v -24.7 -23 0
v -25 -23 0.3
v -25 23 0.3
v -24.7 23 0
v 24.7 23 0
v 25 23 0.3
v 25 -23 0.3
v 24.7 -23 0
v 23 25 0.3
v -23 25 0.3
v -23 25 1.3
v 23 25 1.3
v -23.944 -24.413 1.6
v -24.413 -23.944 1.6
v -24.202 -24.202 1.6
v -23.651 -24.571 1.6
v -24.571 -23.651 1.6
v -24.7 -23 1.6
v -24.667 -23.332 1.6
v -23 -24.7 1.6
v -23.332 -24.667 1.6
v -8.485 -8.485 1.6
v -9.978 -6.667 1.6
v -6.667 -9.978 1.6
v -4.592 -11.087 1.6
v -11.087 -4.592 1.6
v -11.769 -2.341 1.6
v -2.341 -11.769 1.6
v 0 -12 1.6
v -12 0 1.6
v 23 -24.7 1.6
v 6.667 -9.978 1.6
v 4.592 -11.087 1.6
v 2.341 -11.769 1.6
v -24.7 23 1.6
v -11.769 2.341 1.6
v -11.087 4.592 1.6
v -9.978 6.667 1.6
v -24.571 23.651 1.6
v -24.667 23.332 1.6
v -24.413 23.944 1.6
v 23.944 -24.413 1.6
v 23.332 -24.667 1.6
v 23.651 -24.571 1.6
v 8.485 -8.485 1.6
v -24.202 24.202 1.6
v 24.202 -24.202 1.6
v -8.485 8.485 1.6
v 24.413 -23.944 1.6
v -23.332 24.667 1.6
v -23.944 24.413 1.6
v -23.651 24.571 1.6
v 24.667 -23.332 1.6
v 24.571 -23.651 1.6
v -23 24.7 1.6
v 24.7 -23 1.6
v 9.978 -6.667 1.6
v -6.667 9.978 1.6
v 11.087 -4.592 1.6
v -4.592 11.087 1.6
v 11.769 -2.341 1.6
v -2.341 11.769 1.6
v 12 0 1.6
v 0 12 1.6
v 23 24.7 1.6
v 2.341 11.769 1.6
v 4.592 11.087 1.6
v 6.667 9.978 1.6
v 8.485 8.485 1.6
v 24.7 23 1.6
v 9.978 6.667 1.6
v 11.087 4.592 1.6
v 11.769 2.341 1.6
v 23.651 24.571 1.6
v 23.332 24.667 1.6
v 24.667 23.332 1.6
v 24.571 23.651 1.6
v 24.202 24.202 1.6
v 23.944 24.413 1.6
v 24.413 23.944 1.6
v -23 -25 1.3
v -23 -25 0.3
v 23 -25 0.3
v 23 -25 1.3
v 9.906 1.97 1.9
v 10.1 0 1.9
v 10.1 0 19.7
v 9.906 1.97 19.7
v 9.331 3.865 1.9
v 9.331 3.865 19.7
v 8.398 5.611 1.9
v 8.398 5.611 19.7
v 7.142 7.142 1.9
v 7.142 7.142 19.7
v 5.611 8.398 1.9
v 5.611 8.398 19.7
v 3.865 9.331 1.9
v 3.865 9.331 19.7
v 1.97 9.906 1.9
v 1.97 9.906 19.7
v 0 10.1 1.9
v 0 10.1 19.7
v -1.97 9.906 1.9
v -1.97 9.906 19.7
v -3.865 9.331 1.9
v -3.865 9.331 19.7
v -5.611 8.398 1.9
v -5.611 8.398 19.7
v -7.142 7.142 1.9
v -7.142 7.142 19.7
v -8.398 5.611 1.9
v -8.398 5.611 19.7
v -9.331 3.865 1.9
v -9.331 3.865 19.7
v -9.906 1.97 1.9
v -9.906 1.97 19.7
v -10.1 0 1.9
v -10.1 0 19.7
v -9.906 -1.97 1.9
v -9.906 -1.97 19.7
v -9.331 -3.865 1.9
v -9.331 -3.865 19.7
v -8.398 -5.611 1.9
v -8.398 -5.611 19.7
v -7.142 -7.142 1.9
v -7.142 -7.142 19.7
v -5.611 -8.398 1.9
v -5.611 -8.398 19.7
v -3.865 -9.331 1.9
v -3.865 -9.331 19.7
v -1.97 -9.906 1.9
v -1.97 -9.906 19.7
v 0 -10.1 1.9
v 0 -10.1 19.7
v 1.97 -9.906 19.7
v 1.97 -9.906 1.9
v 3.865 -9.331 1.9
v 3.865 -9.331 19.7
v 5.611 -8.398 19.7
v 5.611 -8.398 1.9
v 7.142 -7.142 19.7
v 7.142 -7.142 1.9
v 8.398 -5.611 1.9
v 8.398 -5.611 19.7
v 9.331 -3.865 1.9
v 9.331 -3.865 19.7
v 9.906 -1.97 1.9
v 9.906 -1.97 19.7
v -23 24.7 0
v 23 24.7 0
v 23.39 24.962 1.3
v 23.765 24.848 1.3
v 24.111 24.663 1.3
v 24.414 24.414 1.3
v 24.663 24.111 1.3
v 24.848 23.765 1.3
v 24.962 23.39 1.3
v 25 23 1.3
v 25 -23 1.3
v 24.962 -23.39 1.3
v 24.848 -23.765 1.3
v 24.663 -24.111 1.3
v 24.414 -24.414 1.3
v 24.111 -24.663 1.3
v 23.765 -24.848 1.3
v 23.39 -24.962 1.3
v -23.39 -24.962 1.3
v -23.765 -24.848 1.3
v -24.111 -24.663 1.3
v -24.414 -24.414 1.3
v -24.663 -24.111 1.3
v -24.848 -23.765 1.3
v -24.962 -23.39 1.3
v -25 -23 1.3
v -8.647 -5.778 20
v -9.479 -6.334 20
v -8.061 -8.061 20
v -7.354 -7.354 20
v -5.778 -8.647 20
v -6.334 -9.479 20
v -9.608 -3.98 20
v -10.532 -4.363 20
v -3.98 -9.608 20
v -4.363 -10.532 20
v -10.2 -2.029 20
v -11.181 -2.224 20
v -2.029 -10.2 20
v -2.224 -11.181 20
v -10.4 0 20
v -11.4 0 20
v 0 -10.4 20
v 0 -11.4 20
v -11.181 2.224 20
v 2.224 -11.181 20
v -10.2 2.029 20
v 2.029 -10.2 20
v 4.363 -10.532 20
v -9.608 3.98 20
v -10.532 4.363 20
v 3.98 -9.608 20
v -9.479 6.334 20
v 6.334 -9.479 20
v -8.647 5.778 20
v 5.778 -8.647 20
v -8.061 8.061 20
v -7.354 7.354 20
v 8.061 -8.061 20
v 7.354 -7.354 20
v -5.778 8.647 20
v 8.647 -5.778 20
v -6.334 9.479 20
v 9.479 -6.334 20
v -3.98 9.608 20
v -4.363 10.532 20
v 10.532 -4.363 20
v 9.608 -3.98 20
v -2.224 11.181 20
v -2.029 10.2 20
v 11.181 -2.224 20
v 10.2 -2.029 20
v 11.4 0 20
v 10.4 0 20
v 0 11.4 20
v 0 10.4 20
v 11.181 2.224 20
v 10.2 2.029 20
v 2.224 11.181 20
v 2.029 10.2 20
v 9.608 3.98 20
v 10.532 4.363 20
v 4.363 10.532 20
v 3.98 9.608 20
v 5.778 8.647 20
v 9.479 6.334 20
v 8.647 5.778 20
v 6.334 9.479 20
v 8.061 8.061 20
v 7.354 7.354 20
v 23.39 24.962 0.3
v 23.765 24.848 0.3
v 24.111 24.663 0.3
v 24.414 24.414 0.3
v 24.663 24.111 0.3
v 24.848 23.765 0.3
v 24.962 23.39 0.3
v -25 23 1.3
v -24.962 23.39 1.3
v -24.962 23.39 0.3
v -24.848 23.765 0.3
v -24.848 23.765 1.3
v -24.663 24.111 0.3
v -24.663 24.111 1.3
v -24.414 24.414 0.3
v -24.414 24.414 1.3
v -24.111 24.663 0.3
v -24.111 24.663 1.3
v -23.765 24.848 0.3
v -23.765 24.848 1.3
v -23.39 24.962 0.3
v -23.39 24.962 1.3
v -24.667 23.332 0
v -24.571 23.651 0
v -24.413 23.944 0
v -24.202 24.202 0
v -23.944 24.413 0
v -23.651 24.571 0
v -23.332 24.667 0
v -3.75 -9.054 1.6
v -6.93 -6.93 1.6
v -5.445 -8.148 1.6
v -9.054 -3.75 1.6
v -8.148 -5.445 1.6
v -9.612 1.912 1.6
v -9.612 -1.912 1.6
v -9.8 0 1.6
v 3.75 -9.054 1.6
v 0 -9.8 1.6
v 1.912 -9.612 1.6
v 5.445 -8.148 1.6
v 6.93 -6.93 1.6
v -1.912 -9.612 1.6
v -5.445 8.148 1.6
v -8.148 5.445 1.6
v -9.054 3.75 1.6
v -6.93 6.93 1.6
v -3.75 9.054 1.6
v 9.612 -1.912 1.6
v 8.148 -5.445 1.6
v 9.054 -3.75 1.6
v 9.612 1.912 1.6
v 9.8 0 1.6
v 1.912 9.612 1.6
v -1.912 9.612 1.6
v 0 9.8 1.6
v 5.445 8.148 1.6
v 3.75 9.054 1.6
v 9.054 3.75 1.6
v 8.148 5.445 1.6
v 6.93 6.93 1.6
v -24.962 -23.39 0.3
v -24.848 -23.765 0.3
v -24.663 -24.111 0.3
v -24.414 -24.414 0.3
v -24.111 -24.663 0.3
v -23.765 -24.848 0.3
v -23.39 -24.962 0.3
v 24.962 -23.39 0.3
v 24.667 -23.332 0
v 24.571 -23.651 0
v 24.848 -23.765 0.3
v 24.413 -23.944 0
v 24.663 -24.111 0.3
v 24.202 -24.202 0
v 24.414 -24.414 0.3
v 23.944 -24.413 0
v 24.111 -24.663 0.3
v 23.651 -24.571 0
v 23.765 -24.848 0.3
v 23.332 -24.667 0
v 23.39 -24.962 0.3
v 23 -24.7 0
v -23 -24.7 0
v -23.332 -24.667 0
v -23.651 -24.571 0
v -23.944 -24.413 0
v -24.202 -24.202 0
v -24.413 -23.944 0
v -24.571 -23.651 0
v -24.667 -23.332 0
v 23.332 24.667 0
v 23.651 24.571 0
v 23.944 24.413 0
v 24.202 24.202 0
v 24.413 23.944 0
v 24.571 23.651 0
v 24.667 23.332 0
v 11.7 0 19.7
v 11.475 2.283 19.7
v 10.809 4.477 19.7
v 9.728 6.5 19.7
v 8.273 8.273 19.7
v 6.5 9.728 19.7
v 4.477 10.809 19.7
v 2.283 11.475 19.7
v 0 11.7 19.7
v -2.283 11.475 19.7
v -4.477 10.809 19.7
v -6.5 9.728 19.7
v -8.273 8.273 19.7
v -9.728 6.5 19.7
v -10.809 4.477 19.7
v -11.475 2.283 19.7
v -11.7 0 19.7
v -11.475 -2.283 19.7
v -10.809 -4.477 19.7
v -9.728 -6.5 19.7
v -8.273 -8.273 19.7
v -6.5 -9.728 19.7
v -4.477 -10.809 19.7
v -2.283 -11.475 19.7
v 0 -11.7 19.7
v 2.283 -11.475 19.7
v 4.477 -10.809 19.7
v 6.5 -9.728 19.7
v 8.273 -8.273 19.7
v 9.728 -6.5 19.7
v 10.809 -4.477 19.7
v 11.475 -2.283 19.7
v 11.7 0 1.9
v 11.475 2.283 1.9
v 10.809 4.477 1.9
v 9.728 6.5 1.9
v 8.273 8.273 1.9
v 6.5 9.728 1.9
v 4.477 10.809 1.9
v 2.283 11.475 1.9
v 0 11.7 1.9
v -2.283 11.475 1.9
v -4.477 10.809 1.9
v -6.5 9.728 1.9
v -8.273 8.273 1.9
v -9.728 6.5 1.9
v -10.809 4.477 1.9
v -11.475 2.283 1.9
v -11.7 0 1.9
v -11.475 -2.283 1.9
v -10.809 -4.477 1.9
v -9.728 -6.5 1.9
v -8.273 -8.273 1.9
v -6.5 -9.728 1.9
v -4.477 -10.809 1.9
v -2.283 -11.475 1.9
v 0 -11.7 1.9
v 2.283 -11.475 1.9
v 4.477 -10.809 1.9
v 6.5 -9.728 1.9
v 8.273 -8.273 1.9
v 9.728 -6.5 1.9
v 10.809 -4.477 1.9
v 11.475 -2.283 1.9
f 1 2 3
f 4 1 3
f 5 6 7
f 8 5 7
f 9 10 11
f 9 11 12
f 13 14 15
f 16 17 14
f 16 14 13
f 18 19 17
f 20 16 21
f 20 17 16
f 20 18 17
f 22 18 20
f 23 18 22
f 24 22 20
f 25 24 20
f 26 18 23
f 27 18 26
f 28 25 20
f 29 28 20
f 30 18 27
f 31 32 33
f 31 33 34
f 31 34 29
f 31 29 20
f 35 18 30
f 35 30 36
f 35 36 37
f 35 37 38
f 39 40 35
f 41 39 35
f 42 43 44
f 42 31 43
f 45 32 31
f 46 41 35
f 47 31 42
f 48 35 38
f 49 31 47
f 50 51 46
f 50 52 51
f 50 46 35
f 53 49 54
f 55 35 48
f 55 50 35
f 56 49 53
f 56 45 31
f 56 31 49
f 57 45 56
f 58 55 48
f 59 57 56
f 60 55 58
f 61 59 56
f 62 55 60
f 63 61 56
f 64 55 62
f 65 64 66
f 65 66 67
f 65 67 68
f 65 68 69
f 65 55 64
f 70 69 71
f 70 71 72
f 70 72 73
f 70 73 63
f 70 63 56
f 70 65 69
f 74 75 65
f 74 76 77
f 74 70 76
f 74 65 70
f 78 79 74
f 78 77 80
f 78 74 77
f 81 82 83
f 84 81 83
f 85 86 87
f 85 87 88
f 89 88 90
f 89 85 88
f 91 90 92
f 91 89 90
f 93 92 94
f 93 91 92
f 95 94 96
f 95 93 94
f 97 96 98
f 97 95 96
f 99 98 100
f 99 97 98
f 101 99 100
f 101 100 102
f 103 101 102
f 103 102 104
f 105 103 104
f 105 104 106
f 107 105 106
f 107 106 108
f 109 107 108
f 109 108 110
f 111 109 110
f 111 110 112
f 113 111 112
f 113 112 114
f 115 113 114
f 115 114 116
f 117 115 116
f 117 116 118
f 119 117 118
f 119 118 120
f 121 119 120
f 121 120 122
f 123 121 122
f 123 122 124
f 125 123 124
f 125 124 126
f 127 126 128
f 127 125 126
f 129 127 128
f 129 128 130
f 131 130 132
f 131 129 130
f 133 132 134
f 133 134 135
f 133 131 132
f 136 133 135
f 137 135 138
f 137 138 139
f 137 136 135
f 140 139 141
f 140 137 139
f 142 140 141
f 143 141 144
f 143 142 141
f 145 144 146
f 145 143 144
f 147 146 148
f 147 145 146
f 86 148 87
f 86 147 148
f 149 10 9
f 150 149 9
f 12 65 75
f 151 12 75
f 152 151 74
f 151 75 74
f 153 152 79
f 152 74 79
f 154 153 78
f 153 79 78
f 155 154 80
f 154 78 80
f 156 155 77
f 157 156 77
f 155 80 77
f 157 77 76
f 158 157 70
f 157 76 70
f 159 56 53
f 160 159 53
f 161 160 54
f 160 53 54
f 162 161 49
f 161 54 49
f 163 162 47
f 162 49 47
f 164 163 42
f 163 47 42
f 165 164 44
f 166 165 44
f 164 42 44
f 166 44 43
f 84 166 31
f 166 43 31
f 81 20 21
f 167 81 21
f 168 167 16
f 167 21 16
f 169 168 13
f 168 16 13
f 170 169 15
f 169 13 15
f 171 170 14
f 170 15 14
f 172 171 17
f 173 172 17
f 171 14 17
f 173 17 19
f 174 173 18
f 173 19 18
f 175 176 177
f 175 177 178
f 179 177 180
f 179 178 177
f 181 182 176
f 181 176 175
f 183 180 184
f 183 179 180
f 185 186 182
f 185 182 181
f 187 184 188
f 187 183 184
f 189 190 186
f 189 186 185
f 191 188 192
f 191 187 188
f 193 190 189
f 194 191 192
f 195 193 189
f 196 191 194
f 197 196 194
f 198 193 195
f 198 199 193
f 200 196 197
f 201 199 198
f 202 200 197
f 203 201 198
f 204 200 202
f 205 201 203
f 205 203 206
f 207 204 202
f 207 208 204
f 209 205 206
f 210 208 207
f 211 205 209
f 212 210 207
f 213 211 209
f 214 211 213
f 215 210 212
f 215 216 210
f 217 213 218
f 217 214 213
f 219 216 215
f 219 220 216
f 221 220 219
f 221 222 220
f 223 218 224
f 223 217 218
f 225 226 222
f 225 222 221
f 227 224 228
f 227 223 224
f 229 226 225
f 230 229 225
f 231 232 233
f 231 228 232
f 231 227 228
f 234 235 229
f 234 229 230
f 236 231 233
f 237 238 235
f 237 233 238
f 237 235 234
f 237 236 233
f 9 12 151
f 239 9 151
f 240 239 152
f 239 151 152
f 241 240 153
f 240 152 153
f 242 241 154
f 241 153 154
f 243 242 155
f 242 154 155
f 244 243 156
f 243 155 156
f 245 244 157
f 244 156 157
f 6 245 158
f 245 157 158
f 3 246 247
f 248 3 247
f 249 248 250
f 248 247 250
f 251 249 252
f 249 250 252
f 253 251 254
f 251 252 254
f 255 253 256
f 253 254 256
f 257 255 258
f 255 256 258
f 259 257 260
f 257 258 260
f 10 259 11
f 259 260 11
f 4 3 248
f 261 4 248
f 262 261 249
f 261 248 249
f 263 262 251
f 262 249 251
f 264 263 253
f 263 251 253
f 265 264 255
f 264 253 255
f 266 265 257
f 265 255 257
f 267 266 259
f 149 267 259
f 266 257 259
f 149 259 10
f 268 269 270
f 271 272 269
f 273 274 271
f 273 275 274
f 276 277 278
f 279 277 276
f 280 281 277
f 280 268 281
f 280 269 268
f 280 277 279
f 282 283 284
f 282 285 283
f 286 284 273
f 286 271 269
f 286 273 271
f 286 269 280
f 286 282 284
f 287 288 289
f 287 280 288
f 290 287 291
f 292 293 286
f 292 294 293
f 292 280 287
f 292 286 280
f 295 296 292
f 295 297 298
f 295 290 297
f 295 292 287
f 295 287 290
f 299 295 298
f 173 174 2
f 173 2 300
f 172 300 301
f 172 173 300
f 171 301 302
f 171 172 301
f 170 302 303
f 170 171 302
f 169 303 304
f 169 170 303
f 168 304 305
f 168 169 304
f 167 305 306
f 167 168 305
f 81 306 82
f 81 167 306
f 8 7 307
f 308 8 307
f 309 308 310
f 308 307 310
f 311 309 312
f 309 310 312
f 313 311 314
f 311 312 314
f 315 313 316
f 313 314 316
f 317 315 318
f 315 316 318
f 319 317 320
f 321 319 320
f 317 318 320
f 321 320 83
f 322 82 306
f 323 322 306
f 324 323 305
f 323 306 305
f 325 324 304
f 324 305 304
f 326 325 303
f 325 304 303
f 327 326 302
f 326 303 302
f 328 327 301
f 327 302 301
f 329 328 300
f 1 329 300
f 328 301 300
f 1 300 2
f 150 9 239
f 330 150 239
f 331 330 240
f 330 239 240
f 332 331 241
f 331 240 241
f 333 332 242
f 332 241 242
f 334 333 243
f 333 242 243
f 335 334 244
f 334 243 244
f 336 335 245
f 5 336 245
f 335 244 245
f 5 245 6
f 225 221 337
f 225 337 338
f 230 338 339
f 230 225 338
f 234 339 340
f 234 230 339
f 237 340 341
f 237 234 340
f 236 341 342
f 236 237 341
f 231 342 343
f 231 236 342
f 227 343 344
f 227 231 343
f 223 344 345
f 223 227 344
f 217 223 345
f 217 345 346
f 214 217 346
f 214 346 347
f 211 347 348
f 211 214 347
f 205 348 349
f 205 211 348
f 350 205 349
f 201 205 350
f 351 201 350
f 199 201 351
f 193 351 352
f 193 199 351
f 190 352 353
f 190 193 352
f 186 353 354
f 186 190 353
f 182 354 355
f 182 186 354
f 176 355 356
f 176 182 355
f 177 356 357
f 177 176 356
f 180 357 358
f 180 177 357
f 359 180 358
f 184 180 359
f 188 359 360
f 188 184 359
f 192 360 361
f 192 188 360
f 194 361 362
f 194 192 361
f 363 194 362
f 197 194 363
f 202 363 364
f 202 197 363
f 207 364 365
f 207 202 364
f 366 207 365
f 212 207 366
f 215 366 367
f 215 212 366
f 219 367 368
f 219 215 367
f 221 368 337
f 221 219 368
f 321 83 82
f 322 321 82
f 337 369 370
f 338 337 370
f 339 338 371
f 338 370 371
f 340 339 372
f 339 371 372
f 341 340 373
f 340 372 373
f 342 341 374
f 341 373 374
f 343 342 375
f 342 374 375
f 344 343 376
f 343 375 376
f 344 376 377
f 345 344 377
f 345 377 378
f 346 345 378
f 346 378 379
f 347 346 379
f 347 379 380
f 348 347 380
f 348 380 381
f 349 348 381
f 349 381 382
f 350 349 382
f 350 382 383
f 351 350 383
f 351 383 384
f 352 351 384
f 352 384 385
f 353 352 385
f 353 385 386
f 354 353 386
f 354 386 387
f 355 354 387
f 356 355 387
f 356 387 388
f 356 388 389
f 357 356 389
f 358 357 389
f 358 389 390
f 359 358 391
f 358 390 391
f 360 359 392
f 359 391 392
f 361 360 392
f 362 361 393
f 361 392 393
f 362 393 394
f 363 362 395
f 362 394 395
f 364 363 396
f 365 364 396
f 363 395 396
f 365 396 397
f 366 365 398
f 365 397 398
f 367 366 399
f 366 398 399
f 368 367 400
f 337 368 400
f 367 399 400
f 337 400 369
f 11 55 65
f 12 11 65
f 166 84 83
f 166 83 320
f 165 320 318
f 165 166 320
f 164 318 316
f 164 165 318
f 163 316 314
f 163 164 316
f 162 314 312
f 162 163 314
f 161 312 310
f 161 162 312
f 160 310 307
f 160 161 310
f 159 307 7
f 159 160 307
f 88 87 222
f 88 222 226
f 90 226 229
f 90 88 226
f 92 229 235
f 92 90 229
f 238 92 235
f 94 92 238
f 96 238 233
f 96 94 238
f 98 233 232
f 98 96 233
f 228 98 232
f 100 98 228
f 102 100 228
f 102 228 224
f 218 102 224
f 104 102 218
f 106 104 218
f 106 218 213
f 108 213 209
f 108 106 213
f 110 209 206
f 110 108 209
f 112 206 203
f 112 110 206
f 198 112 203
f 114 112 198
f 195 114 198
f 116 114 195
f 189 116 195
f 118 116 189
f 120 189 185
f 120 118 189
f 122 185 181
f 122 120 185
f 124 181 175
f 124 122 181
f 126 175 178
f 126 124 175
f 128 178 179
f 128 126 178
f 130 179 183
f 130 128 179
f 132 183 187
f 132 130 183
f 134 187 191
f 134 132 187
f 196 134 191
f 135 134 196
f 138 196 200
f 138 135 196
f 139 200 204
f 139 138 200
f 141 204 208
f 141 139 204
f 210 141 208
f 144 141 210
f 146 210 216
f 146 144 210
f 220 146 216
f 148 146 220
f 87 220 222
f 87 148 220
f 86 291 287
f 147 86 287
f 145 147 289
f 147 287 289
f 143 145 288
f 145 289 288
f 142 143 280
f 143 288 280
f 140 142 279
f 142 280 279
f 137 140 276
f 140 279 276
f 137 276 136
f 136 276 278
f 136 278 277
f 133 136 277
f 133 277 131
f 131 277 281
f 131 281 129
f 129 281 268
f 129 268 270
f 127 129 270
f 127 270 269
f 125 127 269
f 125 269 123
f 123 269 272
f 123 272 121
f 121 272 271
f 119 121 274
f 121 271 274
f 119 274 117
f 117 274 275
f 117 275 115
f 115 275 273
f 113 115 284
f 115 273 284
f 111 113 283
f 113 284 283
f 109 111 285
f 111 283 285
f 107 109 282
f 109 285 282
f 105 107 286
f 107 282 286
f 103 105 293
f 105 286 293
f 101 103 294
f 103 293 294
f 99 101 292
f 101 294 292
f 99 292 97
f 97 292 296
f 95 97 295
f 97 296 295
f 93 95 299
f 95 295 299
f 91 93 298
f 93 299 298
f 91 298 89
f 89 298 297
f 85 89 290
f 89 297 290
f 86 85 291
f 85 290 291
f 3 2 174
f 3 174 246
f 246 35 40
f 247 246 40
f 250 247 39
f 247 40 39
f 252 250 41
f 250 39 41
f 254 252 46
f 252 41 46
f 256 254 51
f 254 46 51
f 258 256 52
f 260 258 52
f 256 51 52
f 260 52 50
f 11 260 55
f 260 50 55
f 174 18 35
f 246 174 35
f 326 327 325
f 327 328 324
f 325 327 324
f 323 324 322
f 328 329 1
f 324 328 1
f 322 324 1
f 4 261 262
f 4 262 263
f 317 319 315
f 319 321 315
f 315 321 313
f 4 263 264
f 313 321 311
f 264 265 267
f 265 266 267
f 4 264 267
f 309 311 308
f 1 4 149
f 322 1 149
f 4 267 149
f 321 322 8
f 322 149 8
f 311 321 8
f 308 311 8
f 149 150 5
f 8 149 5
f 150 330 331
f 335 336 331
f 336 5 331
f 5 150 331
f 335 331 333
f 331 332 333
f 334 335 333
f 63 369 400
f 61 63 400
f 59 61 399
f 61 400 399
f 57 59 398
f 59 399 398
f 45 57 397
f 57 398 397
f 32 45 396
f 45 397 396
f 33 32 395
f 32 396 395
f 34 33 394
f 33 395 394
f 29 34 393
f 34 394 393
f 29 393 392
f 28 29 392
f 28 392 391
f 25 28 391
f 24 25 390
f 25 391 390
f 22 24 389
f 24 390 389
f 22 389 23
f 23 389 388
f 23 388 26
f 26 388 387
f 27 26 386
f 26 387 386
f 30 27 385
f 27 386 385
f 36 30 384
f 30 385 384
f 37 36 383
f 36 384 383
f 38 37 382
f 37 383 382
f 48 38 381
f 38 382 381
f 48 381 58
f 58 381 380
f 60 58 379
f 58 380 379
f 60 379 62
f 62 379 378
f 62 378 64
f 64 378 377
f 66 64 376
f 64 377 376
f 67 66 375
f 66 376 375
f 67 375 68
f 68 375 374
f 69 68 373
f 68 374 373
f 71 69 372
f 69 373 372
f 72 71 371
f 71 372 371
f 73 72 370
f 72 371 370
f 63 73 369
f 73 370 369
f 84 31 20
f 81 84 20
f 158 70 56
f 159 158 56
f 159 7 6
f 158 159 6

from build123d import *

# Parameters (mm, degrees)
F1_W     = 50
F1_H     = 50
F1_R     = 11.7
F1_R_2   = 10.1
F2_DEPTH = 1.6
F5_DEPTH = 20
F3_R     = 2
F4_SIZE  = 0.3


with BuildPart() as f2:
    # F1 (on Top) → F2 (new body)
    with BuildSketch(Plane.XY):
        Rectangle(F1_W, F1_H)
        Circle(F1_R, mode=Mode.SUBTRACT)
        Circle(F1_R)
        Circle(F1_R_2, mode=Mode.SUBTRACT)
        Circle(F1_R_2)
    extrude(amount=F2_DEPTH)

    # F1 (on Top) → F5 (join)
    with BuildSketch(Plane.XY):
        Circle(F1_R)
        Circle(F1_R_2, mode=Mode.SUBTRACT)
    extrude(amount=F5_DEPTH)

    # F3
    f3_edges = [f2.edges().sort_by_distance(p)[0] for p in [
        (25, 25, 0.8),
        (25, -25, 0.8),
        (-25, -25, 0.8),
        (-25, 25, 0.8),
    ]]
    fillet(f3_edges, radius=F3_R)

    # F4
    f4_edges = [f2.edges().sort_by_distance(p)[0] for p in [
        (0, 25, 1.6),
        (24.414214, 24.414214, 1.6),
        (-24.414214, 24.414214, 1.6),
        (25, 0, 1.6),
        (-25, 0, 1.6),
        (24.414214, -24.414214, 1.6),
        (-24.414214, -24.414214, 1.6),
        (0, -25, 1.6),
        (-11.7, 0, 1.6),
        (0, 25, 0),
        (24.414214, 24.414214, 0),
        (-24.414214, 24.414214, 0),
        (25, 0, 0),
        (-25, 0, 0),
        (24.414214, -24.414214, 0),
        (-24.414214, -24.414214, 0),
        (0, -25, 0),
        (-10.1, 0, 20),
        (-11.7, 0, 20),
        (-10.1, 0, 1.6),
    ]]
    chamfer(f4_edges, length=F4_SIZE)


solid = f2.part
